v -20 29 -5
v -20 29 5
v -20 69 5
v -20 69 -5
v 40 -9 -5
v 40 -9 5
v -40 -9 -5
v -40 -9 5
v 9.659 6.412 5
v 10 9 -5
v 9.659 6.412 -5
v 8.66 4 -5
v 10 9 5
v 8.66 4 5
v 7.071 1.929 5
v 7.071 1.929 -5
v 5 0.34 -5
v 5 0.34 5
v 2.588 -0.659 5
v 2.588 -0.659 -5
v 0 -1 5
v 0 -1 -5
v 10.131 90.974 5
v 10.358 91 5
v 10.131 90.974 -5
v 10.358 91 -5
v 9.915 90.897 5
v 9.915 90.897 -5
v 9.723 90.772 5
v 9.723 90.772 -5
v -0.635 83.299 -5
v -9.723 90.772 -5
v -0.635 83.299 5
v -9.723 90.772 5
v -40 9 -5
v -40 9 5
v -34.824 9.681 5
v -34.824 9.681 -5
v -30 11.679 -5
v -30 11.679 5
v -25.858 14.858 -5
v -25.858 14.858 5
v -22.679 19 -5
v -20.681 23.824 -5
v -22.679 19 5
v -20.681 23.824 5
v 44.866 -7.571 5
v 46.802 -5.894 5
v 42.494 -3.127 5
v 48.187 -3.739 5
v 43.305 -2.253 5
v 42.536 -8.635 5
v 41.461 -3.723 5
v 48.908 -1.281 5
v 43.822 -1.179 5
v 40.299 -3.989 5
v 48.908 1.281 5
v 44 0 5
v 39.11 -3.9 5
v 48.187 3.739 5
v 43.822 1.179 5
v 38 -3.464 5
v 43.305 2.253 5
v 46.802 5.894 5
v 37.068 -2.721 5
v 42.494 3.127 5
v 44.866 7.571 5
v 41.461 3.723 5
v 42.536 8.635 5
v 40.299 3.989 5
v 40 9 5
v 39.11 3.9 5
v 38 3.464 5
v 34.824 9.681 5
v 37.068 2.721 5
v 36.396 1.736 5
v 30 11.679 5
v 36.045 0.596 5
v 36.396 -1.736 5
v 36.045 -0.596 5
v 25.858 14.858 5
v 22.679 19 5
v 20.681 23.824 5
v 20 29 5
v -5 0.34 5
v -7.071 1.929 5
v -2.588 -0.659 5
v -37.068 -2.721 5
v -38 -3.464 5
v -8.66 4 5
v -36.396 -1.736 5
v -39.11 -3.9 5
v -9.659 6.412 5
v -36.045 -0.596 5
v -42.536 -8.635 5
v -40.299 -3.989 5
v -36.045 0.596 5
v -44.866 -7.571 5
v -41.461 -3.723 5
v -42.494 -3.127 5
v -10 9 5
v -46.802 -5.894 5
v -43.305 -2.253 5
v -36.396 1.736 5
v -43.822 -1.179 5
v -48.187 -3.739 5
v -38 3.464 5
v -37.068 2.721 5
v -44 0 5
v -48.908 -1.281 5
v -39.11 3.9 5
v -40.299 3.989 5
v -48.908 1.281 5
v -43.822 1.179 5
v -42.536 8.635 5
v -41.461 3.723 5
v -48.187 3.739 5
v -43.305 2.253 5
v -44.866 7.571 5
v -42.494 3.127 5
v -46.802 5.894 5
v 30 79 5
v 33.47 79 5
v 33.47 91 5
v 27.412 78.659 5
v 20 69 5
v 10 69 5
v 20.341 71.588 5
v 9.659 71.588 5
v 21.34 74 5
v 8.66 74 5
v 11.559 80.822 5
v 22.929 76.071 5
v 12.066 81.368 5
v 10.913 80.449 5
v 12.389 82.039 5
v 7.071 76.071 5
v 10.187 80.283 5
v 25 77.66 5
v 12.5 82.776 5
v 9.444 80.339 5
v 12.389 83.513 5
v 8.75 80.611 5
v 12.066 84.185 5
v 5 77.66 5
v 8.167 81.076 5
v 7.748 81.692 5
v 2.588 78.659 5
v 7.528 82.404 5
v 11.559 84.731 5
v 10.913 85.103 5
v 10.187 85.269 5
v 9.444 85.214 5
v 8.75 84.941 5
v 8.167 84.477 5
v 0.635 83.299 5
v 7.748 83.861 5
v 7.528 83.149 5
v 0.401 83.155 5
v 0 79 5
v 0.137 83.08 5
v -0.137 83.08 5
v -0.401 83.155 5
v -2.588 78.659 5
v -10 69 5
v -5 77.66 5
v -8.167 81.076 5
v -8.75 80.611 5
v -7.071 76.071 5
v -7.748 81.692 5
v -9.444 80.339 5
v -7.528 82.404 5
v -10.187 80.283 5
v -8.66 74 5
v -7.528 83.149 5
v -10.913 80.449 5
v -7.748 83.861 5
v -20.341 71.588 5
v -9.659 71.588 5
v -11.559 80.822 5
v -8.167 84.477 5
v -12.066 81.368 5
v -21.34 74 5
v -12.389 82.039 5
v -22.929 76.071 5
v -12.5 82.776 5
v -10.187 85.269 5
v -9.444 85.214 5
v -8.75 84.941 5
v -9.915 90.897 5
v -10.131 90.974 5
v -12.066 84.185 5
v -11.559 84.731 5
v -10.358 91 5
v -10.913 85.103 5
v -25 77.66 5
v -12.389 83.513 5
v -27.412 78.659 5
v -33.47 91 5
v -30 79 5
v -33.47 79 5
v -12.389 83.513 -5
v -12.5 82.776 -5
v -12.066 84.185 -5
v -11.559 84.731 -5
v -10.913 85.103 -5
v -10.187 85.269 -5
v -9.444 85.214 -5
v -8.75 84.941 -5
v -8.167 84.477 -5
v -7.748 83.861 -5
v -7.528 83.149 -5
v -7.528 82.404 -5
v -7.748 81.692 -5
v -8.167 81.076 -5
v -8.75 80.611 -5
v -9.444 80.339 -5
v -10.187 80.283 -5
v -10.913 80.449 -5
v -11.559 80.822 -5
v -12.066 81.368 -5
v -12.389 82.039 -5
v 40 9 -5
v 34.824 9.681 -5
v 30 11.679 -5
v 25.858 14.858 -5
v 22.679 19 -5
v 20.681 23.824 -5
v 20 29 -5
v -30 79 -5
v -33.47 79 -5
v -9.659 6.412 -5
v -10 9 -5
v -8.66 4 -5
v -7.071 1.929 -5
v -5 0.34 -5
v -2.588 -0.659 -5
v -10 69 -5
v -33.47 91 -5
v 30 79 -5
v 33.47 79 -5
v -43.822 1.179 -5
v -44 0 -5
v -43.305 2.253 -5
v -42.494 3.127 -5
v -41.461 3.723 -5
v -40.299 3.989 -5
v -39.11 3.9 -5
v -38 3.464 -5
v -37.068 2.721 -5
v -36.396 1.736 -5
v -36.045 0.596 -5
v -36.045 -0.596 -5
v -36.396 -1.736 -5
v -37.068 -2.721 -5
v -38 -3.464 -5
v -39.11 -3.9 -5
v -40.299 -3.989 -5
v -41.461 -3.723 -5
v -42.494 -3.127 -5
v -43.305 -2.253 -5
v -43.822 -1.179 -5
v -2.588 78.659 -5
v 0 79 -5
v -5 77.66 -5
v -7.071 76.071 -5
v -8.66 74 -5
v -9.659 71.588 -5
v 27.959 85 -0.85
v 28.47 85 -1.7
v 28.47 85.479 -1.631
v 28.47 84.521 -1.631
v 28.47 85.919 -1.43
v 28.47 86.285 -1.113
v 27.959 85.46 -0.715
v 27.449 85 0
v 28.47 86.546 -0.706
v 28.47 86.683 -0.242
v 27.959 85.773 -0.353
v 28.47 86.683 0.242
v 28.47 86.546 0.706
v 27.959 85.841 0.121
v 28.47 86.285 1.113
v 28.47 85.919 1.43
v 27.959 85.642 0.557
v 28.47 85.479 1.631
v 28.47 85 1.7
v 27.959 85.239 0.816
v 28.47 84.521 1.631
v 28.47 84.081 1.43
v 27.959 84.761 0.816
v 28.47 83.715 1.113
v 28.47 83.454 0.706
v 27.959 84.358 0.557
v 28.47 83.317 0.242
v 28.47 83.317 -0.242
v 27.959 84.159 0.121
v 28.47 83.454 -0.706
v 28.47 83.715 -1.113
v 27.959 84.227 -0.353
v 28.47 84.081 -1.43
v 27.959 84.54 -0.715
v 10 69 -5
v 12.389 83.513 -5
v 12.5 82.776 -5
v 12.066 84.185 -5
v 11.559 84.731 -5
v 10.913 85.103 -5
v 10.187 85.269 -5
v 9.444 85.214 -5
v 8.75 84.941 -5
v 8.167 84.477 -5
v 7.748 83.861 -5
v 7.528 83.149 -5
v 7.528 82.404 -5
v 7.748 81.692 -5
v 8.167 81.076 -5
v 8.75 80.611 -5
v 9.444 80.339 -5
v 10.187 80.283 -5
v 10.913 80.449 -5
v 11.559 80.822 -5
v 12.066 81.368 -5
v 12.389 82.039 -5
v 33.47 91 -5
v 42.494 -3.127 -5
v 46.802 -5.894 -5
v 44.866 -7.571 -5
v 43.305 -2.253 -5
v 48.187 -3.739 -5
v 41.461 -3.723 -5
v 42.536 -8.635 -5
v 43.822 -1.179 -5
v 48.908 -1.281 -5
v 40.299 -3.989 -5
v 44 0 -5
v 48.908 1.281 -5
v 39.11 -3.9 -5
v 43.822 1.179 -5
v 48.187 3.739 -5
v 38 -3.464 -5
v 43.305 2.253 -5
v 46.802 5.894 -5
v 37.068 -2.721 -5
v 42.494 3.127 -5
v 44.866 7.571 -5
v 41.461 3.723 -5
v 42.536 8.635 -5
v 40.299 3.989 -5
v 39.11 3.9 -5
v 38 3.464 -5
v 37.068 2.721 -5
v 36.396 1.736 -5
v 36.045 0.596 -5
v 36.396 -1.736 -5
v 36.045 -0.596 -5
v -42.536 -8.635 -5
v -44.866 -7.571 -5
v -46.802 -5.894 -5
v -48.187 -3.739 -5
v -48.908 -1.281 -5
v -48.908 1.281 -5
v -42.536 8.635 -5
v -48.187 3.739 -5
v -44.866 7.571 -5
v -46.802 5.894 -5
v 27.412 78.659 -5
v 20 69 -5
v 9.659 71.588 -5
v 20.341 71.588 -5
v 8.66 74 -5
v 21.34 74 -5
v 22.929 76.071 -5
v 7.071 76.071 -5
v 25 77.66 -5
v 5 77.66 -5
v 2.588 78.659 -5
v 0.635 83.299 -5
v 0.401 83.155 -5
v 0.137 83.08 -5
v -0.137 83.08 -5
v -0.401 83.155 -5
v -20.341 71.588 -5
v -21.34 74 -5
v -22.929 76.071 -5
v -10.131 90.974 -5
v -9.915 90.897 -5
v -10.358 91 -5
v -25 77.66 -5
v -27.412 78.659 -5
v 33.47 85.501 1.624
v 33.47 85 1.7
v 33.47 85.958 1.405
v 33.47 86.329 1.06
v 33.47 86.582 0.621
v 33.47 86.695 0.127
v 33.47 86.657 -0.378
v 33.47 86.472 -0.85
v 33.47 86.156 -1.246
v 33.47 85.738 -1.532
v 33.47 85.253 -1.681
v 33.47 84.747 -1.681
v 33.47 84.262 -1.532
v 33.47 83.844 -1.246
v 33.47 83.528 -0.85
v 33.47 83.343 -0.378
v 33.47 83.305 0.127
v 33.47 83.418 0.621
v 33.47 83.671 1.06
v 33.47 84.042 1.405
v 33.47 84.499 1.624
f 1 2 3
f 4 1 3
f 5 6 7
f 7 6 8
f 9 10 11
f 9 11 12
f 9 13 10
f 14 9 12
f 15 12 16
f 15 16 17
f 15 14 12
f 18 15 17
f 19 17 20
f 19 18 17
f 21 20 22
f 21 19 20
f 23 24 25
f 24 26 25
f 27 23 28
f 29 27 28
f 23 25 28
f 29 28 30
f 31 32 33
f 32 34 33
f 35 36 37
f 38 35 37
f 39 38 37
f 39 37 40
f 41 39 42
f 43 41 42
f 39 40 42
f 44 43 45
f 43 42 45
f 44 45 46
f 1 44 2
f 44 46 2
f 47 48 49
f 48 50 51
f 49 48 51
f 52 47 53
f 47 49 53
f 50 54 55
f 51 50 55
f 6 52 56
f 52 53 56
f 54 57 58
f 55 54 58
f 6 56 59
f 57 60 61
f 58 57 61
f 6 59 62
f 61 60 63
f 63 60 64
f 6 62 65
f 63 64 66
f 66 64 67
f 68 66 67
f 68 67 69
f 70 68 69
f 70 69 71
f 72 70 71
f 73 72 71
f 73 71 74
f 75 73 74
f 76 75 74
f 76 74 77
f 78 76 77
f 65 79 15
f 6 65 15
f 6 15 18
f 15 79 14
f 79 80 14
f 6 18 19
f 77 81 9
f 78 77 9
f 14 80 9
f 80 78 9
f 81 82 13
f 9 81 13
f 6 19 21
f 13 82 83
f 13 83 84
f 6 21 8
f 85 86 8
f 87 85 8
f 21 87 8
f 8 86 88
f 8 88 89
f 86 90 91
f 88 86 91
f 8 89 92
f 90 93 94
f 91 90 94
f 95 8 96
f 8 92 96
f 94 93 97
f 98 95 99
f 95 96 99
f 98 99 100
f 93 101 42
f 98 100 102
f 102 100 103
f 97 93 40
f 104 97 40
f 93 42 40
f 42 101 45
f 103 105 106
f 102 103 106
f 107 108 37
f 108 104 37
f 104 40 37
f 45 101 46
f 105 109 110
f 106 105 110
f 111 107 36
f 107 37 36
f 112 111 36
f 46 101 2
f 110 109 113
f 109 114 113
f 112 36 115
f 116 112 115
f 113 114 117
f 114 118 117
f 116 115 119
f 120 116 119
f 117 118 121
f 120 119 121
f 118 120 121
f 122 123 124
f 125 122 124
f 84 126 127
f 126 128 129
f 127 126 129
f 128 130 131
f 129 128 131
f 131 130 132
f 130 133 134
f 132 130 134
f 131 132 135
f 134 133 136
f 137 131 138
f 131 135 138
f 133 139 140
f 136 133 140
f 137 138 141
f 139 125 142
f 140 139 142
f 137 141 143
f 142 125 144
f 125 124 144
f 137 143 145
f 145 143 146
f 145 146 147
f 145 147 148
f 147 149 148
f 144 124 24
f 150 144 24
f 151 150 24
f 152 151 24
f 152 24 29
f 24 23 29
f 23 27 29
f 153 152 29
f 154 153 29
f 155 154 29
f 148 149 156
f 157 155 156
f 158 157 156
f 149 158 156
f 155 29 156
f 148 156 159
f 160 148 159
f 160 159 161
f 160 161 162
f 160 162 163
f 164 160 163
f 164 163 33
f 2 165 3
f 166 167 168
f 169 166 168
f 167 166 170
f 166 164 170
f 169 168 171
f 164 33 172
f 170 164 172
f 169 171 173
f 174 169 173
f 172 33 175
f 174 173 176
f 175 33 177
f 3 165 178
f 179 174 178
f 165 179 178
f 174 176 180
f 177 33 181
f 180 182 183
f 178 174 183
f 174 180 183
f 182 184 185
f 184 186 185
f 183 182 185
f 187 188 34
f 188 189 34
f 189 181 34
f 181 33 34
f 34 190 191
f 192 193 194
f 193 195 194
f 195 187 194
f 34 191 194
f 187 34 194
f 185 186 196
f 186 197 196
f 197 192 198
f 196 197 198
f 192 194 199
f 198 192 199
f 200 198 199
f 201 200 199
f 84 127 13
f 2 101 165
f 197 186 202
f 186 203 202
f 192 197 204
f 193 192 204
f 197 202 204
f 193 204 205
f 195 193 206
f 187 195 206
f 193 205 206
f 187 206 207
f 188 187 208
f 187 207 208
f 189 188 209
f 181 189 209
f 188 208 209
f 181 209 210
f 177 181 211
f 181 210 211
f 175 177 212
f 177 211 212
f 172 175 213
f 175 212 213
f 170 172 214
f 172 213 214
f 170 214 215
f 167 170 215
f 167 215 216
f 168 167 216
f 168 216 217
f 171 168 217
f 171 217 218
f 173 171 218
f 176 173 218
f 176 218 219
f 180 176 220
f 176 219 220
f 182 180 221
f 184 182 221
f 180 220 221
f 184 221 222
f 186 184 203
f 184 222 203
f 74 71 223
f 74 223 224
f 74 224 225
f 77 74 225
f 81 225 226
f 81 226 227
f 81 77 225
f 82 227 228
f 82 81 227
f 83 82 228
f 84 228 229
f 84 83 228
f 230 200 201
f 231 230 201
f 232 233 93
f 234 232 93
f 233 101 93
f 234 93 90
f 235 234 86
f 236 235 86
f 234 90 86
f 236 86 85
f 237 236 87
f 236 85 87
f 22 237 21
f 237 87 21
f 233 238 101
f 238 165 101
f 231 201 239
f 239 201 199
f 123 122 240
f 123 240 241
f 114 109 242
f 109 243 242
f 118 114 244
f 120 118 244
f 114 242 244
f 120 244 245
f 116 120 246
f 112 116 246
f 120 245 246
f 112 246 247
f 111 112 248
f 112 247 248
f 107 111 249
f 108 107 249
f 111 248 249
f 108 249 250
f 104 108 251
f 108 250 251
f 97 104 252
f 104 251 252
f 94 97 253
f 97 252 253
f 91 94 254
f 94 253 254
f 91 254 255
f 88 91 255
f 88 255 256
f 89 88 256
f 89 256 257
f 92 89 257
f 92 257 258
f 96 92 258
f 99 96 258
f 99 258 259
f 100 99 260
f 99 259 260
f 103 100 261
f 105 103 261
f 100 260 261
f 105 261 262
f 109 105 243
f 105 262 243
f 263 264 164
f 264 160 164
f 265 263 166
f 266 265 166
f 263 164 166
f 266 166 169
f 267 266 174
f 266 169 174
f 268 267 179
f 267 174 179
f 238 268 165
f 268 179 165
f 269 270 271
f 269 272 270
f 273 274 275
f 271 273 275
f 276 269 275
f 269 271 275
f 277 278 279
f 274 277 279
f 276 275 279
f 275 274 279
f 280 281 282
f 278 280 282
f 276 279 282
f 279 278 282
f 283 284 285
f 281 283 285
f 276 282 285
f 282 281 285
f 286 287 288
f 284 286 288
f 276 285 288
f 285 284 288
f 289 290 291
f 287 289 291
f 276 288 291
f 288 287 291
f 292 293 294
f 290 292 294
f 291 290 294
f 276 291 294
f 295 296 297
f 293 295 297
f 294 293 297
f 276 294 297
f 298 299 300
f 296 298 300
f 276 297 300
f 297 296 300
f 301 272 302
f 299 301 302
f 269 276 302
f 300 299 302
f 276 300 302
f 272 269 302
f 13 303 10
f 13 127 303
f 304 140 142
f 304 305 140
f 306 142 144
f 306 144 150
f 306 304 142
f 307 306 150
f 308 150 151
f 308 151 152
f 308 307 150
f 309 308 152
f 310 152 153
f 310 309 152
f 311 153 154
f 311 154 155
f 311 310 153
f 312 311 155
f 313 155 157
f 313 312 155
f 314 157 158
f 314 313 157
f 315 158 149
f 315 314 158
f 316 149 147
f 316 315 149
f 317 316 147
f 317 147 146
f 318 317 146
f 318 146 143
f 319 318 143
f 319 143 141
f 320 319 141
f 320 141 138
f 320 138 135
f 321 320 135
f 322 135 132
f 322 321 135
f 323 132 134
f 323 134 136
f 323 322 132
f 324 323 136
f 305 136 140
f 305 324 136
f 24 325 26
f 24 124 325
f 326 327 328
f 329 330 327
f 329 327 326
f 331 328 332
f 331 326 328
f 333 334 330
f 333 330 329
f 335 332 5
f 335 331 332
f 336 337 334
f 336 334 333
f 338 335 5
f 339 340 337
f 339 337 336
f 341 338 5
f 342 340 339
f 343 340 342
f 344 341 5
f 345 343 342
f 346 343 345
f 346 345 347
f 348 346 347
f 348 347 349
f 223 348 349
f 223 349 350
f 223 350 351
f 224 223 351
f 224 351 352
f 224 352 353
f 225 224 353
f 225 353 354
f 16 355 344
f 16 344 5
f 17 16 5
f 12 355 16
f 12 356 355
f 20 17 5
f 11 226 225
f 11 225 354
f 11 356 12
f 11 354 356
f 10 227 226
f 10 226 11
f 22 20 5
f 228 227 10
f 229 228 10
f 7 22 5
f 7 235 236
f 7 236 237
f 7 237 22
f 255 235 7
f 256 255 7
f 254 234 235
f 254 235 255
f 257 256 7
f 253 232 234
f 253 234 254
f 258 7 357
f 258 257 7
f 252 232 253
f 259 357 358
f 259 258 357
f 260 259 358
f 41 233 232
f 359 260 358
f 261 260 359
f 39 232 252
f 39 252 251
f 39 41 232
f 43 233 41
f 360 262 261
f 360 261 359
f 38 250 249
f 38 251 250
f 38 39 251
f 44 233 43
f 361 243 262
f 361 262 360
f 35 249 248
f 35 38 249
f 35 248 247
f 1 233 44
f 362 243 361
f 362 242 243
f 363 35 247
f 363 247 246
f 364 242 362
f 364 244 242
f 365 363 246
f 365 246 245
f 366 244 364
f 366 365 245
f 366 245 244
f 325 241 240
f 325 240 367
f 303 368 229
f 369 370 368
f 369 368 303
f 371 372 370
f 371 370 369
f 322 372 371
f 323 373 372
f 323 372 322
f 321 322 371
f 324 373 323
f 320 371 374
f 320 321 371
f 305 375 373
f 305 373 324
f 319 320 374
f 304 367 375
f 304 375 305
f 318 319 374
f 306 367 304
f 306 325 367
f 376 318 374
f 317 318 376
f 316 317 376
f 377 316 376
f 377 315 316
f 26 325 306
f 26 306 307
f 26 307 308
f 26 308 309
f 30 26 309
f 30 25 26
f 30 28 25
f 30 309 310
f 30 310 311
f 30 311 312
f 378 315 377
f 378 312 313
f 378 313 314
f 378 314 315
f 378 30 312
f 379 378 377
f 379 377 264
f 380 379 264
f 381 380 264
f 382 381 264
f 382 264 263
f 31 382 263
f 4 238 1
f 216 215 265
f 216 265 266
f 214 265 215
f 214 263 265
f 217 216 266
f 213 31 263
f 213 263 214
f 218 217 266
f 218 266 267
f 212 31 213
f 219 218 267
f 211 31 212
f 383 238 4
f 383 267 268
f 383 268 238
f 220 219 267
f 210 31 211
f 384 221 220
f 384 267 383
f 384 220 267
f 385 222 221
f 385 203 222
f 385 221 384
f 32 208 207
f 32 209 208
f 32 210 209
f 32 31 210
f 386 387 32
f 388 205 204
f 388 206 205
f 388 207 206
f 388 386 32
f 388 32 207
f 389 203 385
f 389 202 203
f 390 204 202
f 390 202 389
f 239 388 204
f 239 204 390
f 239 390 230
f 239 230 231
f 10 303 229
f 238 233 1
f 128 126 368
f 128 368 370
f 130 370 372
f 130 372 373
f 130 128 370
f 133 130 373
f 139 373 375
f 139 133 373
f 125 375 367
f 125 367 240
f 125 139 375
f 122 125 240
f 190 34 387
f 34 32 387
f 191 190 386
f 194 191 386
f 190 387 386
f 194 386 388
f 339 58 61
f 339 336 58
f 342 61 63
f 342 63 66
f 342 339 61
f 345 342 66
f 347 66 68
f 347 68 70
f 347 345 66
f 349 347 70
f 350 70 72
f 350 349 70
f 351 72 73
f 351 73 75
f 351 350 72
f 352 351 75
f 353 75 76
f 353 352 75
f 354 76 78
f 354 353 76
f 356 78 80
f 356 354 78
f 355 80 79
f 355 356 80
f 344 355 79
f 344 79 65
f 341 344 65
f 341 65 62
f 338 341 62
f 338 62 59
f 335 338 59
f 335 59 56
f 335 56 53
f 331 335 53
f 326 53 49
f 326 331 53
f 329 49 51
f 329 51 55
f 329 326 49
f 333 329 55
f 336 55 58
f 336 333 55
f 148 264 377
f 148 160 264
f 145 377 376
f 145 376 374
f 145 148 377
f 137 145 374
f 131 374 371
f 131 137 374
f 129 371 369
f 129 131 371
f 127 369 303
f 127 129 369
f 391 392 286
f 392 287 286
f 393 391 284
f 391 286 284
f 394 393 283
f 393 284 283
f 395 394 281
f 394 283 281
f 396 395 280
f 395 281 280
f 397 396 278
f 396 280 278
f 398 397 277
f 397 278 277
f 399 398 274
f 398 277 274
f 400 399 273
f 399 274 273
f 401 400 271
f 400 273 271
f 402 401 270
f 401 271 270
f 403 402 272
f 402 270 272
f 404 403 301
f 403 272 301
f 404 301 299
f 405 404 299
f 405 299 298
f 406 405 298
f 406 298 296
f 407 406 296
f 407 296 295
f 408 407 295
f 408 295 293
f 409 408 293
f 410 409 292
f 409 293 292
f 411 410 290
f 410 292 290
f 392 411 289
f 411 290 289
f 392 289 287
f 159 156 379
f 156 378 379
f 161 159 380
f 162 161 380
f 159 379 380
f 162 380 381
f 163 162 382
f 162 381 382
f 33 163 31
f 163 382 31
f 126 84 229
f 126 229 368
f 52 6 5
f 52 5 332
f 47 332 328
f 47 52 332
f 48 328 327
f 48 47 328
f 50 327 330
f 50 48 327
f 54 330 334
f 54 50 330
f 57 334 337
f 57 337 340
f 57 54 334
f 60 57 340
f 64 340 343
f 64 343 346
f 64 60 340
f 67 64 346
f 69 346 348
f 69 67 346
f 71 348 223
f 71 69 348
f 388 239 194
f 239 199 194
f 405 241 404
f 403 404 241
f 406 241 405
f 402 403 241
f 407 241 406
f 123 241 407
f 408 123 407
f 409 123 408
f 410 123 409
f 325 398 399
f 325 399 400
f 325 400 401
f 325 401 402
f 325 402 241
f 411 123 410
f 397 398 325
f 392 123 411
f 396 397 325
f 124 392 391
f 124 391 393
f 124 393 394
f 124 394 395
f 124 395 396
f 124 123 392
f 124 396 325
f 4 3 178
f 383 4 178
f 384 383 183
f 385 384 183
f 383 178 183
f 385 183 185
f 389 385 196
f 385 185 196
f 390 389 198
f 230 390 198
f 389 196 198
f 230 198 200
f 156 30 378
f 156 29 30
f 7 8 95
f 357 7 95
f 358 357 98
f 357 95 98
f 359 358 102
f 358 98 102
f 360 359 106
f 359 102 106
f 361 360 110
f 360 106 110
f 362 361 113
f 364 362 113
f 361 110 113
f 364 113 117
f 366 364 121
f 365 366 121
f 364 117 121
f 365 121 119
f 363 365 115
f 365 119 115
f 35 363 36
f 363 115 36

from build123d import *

# Parameters (mm, degrees)
SKETCH1_R                = 2.5
SKETCH1_R_2              = 4
BOSS_EXTRUDE1_DEPTH      = 5
FILLET1_R                = 1
M3_CLEARANCE_HOLE1_D     = 3.4
M3_CLEARANCE_HOLE1_DEPTH = 5
M3_CLEARANCE_HOLE1_TIP   = 1.021463052


with BuildPart() as part:
    # Sketch1 → Boss-Extrude1 (new, symmetric)
    with BuildSketch(Plane.XY):
        with BuildLine():
            ThreePointArc((10, 9), (7.071067812, 1.928932188), (0, -1))
            Line((0, -1), (0, -9))
            Line((0, -9), (40, -9))
            ThreePointArc((40, -9), (49, 0), (40, 9))
            ThreePointArc((40, 9), (25.857864376, 14.857864376), (20, 29))
            Line((20, 29), (20, 69))
            ThreePointArc((20, 69), (22.928932188, 76.071067812), (30, 79))
            Line((30, 79), (33.47, 79))
            Line((33.47, 79), (33.47, 91))
            Line((33.47, 91), (10, 91))
            Line((10, 91), (0, 82.776266062))
            Line((0, 82.776266062), (0, 79))
            ThreePointArc((0, 79), (7.071067812, 76.071067812), (10, 69))
            Line((10, 69), (10, 9))
        make_face()
        with Locations((10, 82.776266062)):
            Circle(SKETCH1_R, mode=Mode.SUBTRACT)
        with Locations((40, 0)):
            Circle(SKETCH1_R_2, mode=Mode.SUBTRACT)
    boss_extrude1 = extrude(amount=BOSS_EXTRUDE1_DEPTH, both=True)

    # Mirror1: Boss-Extrude1 across plane
    add(boss_extrude1.mirror(Plane(origin=(0, 0, 5), x_dir=(0, 0, 1), z_dir=(-1, 0, 0))))

    # Fillet1
    fillet1_edges = [part.edges().sort_by_distance(p)[0] for p in [
        (0, 82.776266062, 0),
        (10, 91, 0),
        (-10, 91, 0),
    ]]
    fillet(fillet1_edges, radius=FILLET1_R)

    # M3 Clearance Hole1
    with Locations(Plane(origin=(33.47, 0, 0), x_dir=(0, 0, -1), z_dir=(1, 0, 0))):
        with Locations((0, 85)):
            Hole(M3_CLEARANCE_HOLE1_D / 2, depth=M3_CLEARANCE_HOLE1_DEPTH)
            with Locations((0, 0, -(M3_CLEARANCE_HOLE1_DEPTH + M3_CLEARANCE_HOLE1_TIP / 2))):  # 118° drill point
                Cone(0, M3_CLEARANCE_HOLE1_D / 2, M3_CLEARANCE_HOLE1_TIP, mode=Mode.SUBTRACT)


solid = part.part
